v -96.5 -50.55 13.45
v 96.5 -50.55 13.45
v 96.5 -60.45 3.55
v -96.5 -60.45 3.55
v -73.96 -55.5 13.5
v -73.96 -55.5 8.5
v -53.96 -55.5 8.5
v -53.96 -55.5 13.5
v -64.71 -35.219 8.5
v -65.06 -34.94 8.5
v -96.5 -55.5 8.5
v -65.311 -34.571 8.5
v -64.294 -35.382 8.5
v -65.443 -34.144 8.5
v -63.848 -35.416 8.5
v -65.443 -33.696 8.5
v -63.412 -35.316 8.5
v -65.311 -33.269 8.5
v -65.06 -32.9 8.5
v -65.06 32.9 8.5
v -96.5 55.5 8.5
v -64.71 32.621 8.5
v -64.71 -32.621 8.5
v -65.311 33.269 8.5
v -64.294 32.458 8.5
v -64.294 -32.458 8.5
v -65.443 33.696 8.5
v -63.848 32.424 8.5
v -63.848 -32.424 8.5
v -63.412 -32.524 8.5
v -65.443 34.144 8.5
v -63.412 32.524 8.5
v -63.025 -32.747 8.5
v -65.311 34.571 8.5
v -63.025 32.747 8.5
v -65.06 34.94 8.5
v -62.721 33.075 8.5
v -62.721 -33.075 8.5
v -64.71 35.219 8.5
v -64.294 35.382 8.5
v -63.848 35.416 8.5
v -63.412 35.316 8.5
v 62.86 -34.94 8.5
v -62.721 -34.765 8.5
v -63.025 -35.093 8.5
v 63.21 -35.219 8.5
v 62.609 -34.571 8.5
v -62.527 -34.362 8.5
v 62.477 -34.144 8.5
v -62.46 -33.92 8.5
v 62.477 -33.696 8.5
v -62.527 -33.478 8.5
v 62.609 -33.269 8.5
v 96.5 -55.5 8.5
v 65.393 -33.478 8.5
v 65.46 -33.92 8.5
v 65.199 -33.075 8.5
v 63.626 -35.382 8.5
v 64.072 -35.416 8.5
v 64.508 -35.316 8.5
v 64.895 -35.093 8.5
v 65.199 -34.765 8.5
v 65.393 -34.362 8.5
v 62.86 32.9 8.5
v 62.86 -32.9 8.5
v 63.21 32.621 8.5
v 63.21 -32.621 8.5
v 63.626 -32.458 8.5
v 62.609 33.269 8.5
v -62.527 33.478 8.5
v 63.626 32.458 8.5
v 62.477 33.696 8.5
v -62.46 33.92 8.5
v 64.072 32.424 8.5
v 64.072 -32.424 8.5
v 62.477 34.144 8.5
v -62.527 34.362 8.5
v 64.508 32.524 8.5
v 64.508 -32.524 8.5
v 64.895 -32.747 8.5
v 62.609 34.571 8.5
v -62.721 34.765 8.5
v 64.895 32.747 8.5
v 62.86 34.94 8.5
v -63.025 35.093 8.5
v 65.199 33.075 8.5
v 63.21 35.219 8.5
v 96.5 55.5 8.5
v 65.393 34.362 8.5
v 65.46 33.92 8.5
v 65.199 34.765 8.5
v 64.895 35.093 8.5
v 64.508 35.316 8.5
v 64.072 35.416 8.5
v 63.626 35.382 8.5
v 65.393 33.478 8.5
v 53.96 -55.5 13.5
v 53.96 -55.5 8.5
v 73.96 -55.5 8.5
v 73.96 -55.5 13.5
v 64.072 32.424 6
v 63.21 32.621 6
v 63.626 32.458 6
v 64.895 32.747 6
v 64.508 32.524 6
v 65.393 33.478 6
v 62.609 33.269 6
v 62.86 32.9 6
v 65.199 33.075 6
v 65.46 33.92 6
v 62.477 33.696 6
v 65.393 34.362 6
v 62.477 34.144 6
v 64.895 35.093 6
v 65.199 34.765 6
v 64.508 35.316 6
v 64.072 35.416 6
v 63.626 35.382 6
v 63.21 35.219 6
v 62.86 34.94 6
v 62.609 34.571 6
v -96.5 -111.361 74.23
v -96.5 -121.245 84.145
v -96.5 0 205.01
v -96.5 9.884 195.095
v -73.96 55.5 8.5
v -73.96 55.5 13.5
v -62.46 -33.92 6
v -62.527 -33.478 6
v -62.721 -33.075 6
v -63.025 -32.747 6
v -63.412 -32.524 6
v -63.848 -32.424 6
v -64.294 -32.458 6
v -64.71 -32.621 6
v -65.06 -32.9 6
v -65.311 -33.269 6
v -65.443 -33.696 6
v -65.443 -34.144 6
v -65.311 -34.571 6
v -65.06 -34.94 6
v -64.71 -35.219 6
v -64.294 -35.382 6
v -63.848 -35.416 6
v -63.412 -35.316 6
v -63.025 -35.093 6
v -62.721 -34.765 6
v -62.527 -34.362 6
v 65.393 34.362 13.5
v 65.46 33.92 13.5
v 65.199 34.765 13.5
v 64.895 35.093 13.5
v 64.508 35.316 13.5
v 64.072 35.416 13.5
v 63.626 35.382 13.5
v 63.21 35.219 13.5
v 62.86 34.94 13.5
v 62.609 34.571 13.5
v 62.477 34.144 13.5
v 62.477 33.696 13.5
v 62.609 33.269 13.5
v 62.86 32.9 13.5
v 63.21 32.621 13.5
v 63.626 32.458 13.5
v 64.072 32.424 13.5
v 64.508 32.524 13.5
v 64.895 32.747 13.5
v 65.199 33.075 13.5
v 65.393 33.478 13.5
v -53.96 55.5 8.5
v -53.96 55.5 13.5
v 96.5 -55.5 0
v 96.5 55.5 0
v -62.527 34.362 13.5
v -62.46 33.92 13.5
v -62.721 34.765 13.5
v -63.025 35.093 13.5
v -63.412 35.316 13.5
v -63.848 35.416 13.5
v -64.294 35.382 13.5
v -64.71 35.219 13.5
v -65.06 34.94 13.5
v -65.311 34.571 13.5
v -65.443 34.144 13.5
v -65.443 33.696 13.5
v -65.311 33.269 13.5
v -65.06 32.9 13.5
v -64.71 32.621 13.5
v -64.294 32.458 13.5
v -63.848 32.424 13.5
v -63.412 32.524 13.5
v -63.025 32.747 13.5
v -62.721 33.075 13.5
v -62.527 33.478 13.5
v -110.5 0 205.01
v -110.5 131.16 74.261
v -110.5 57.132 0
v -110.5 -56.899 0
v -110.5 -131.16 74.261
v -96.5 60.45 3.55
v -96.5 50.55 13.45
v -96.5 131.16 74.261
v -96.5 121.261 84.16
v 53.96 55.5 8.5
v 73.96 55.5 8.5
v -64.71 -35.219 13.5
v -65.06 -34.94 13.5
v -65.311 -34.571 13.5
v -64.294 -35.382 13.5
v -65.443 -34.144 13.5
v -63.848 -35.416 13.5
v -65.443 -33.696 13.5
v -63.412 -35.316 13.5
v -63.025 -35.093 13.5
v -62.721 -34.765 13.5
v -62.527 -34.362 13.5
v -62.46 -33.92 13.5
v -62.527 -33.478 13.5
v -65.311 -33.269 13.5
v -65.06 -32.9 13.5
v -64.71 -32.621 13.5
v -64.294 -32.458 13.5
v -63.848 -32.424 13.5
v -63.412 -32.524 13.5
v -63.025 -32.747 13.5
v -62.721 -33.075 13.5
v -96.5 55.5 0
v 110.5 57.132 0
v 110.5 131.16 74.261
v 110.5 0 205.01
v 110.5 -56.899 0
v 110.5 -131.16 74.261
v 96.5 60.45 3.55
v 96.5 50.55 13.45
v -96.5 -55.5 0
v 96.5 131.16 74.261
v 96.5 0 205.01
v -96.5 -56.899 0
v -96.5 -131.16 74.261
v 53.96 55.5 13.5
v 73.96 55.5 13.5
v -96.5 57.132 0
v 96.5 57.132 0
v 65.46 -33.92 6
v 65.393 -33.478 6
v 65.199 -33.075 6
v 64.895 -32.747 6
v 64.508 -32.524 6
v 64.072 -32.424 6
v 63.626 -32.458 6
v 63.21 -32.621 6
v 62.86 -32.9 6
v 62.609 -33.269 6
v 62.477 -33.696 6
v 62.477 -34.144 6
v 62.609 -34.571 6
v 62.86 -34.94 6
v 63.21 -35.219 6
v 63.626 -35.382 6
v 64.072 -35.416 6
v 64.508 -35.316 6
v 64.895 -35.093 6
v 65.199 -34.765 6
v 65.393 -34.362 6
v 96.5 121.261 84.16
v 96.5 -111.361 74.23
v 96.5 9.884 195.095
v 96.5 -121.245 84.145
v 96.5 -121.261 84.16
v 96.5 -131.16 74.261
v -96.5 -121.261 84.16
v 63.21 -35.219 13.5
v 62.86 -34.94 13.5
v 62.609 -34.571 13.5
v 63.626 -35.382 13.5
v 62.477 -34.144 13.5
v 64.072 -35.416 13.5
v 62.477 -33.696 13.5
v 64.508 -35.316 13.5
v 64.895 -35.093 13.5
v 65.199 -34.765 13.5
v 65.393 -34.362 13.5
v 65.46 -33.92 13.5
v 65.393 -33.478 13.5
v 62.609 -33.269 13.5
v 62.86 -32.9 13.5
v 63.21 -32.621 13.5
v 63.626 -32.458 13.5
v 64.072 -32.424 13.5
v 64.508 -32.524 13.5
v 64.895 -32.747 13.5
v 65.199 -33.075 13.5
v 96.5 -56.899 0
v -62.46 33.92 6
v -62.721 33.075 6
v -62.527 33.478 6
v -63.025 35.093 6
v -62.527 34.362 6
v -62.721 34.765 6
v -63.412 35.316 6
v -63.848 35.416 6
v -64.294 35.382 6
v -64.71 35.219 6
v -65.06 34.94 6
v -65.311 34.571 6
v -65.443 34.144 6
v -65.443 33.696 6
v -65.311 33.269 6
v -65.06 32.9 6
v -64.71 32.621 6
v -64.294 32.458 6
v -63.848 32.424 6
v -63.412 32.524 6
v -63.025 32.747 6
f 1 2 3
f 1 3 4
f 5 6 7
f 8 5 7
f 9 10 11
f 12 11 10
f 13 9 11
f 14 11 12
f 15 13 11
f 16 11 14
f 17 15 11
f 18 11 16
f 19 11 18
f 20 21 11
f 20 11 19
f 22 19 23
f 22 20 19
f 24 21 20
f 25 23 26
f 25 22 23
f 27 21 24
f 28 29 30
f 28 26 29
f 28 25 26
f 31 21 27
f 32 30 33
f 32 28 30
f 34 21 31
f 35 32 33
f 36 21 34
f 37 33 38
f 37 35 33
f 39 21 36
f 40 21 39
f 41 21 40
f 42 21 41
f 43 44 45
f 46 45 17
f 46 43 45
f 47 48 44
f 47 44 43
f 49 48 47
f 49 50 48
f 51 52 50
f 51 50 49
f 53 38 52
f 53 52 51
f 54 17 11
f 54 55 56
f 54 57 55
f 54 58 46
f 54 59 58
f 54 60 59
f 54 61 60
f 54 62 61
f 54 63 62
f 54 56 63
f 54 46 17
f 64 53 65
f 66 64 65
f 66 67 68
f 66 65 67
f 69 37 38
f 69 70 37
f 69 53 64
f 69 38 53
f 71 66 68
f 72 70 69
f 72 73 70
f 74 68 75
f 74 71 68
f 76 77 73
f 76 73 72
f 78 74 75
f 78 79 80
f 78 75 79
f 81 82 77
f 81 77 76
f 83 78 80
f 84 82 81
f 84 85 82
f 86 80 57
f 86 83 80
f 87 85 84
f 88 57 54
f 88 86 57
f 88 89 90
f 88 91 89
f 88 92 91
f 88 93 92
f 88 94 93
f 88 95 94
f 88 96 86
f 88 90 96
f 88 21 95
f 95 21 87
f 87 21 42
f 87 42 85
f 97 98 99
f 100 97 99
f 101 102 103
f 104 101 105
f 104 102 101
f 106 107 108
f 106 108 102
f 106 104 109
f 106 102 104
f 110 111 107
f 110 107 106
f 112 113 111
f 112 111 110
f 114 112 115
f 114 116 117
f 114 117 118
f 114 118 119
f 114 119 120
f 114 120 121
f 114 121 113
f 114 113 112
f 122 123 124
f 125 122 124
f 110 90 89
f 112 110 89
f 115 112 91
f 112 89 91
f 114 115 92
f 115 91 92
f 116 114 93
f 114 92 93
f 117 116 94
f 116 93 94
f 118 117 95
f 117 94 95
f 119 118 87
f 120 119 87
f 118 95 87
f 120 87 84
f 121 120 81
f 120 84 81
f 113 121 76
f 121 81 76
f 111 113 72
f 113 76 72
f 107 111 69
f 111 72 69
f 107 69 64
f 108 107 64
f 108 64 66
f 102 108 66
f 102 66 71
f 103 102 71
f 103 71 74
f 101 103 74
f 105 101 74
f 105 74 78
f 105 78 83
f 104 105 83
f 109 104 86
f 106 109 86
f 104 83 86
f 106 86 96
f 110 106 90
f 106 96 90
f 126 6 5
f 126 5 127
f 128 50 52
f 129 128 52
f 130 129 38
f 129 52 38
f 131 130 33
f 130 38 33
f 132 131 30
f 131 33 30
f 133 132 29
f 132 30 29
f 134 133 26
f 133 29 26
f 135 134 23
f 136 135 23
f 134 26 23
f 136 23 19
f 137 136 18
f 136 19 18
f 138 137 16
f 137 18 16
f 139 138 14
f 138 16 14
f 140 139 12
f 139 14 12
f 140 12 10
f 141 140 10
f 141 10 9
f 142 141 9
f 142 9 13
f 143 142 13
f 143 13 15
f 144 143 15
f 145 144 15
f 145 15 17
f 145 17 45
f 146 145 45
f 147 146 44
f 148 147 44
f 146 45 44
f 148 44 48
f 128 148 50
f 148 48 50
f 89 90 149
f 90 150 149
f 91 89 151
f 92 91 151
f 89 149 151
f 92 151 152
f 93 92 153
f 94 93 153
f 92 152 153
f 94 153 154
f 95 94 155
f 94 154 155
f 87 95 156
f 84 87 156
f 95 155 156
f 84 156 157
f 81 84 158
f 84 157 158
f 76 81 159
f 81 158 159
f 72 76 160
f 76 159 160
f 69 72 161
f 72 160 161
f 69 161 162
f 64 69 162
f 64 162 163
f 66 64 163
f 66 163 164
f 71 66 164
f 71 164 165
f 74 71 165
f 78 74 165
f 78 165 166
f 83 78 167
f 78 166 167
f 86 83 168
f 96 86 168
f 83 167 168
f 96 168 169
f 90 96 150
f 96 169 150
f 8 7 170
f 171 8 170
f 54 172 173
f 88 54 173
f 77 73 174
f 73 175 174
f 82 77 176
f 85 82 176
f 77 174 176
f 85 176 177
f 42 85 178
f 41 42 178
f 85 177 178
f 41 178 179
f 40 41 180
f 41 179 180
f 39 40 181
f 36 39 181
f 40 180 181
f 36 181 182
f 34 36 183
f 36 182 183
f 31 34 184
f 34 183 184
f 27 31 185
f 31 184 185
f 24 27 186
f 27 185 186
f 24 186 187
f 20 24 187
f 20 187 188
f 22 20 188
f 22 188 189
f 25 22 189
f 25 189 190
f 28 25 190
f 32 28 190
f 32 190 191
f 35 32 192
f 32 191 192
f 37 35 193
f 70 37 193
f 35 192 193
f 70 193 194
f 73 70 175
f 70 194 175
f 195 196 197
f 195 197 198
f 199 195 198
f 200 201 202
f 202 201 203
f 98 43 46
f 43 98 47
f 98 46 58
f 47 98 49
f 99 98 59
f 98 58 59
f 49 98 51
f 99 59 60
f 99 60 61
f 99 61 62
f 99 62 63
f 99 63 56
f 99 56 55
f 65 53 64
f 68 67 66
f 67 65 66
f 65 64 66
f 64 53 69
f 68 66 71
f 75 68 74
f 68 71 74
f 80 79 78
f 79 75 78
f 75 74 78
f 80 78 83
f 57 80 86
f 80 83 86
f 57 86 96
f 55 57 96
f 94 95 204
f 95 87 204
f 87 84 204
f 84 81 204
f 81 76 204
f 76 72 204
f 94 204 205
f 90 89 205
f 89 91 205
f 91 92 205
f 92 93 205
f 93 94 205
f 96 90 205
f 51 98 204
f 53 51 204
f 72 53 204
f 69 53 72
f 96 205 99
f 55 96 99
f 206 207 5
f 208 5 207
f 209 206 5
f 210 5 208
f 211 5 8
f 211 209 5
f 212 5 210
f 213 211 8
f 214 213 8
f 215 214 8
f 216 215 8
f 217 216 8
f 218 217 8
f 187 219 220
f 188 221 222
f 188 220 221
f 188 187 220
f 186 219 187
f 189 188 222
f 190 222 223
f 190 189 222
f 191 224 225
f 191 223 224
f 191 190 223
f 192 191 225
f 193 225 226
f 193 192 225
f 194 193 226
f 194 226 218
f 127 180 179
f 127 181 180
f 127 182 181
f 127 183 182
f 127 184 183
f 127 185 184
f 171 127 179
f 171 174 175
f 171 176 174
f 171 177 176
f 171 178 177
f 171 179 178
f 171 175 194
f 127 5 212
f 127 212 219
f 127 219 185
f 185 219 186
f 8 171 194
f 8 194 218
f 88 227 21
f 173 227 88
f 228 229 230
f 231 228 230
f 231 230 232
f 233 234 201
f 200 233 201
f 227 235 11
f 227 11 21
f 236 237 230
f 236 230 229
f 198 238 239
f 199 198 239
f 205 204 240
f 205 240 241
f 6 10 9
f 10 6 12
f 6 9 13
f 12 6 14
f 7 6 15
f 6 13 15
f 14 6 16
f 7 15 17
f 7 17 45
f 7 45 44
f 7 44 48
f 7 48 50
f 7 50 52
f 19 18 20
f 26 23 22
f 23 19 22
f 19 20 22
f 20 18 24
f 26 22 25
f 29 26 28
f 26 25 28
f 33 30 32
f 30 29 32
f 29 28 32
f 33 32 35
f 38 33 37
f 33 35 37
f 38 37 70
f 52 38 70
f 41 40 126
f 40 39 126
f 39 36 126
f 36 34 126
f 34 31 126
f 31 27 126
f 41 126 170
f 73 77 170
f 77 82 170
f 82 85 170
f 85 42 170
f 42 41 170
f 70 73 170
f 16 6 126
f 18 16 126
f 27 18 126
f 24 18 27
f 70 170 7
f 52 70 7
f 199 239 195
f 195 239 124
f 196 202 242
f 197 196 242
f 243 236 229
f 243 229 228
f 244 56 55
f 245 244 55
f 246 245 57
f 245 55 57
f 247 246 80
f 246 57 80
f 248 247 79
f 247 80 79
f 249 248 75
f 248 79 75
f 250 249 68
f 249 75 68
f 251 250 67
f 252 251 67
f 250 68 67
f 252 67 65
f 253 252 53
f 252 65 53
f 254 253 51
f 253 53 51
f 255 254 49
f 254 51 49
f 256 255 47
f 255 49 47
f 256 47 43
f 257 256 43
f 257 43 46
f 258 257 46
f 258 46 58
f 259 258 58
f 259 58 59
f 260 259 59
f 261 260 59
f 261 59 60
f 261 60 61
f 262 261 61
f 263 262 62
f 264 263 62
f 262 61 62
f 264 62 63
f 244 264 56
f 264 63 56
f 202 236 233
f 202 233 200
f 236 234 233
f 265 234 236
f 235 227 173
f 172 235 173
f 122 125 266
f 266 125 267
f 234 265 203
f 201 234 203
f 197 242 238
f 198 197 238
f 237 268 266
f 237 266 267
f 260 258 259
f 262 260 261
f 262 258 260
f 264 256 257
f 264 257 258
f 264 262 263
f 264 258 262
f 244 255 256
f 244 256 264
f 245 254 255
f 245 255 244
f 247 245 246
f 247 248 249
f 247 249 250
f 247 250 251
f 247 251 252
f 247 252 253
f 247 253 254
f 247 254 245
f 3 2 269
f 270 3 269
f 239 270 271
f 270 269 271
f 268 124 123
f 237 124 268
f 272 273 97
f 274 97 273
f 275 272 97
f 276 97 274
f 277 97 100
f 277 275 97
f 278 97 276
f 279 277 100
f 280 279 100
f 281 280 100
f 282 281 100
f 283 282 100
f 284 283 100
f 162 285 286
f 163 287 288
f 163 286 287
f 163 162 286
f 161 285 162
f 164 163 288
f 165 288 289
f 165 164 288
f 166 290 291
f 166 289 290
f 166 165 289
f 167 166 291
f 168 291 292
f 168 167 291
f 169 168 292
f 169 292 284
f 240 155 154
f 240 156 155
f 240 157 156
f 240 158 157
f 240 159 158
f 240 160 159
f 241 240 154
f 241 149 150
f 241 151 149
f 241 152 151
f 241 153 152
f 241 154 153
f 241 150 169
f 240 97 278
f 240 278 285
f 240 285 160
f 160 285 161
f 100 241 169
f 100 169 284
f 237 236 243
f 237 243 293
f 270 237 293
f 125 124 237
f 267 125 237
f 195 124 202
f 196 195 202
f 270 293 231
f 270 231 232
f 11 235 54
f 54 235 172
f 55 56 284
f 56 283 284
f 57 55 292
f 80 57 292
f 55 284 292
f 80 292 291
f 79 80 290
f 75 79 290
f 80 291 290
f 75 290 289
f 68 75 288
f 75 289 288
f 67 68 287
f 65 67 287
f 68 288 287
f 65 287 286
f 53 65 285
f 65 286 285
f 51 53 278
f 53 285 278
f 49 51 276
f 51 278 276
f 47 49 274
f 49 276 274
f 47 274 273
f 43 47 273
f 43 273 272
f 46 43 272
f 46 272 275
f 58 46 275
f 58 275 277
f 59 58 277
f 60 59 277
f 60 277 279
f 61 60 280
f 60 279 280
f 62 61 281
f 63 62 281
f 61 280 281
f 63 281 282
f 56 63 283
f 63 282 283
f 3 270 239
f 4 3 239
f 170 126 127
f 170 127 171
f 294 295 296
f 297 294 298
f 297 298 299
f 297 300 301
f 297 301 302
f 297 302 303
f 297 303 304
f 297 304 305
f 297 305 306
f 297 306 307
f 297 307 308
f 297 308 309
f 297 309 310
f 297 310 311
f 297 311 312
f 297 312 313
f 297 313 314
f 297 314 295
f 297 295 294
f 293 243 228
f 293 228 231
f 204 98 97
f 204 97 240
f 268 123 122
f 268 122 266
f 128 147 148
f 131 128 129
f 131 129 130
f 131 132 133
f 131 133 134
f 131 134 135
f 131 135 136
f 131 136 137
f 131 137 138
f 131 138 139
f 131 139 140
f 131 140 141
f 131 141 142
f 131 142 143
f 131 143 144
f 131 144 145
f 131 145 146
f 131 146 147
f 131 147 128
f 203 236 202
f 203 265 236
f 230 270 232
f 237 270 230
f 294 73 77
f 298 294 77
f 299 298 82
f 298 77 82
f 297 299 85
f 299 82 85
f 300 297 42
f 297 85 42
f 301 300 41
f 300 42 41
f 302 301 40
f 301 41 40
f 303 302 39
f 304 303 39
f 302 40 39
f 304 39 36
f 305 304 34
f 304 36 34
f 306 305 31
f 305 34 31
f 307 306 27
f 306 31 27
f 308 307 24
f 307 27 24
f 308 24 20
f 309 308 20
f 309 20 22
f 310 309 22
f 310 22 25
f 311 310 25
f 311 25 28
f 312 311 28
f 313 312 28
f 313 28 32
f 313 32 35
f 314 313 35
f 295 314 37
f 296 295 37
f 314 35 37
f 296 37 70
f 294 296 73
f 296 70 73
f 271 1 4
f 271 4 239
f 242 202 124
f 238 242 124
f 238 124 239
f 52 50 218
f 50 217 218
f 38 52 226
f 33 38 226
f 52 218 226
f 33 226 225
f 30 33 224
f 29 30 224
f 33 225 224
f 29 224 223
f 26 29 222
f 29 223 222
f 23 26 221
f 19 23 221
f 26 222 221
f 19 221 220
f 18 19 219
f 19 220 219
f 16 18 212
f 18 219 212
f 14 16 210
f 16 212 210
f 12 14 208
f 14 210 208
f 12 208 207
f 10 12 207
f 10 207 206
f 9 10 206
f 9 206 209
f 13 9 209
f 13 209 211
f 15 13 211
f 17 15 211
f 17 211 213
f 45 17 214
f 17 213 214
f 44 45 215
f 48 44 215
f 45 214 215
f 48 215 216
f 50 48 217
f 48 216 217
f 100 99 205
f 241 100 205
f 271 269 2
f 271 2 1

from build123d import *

# Parameters (mm, degrees)
F0_W          = 193
F0_H          = 111
F1_DEPTH      = 8.5
F2_W          = 20
F2_H          = 111
F3_DEPTH      = 5
F4_R          = 1.5
F5_DEPTH      = 5.001
F5_DEPTH_BACK = 2.5
F7_W          = 193
F7_H          = 100
F8_DEPTH      = 7
F11_DEPTH     = 14
F13_W         = 193
F13_H         = 171.1982
F14_DEPTH     = 14


with BuildPart() as f1:
    # F0 (on Top) → F1 (new body)
    with BuildSketch(Plane.XY):
        Rectangle(F0_W, F0_H)
    extrude(amount=F1_DEPTH)


with BuildPart() as f3:
    # F2 (on face) → F3 (new body)
    with BuildSketch(Plane.XY.offset(8.5)):
        with Locations((-63.96, 0)):
            Rectangle(F2_W, F2_H)
        with Locations((63.96, 0)):
            Rectangle(F2_W, F2_H)
    extrude(amount=F3_DEPTH)


with BuildPart() as f5_tool:
    # F4 (on face) → F5 (new body, two sides)
    with BuildSketch(Plane.XY.offset(8.5)) as f5_sk:
        with Locations((-63.96, 33.92)):
            Circle(F4_R)
        with Locations((63.96, 33.92)):
            Circle(F4_R)
        with Locations((-63.96, -33.92)):
            Circle(F4_R)
        with Locations((63.96, -33.92)):
            Circle(F4_R)
    extrude(amount=F5_DEPTH)
    extrude(f5_sk.sketch, amount=-F5_DEPTH_BACK)


with BuildPart() as f1_1:
    add(f1.part)

    # F5: cut by f5_tool
    add(f5_tool.part, mode=Mode.SUBTRACT)


with BuildPart() as f3_1:
    add(f3.part)

    # F5: cut by f5_tool
    add(f5_tool.part, mode=Mode.SUBTRACT)


with BuildPart() as f8:
    # F7 (on face) → F8 (new body, symmetric)
    with BuildSketch(Plane(origin=(0, -23.5, -23.5), x_dir=(-1, 0, 0), z_dir=(0, 0.707107, 0.707107))):
        with Locations((0, 95.254834)):
            Rectangle(F7_W, F7_H)
    extrude(amount=F8_DEPTH, both=True)


with BuildPart() as f9_1:
    # F9: instance of F8
    add(f8.part.mirror(Plane.XZ))


with BuildPart() as f11:
    # F10 (on face) → F11 (new body)
    with BuildSketch(Plane(origin=(-96.5, 0, 0), x_dir=(0, -1, 0), z_dir=(-1, 0, 0))):
        Polygon((56.899495, 0), (131.160426, 74.260931), (0, 205.009963), (-131.160426, 74.260931), (-57.132419, 0), align=None)
    extrude(amount=F11_DEPTH)


with BuildPart() as f12_1:
    # F12: instance of F11
    add(f11.part.mirror(Plane.YZ))


with BuildPart() as f14:
    # F13 (on face) → F14 (new body)
    with BuildSketch(Plane(origin=(0, -102.504476, 102.826999), x_dir=(1, 0, 0), z_dir=(0, -0.705995, 0.708217))):
        with Locations((0, 59.136955)):
            Rectangle(F13_W, F13_H)
    extrude(amount=-F14_DEPTH)


solid = Compound([f1_1.part, f3_1.part, f8.part, f9_1.part, f11.part, f12_1.part, f14.part])
